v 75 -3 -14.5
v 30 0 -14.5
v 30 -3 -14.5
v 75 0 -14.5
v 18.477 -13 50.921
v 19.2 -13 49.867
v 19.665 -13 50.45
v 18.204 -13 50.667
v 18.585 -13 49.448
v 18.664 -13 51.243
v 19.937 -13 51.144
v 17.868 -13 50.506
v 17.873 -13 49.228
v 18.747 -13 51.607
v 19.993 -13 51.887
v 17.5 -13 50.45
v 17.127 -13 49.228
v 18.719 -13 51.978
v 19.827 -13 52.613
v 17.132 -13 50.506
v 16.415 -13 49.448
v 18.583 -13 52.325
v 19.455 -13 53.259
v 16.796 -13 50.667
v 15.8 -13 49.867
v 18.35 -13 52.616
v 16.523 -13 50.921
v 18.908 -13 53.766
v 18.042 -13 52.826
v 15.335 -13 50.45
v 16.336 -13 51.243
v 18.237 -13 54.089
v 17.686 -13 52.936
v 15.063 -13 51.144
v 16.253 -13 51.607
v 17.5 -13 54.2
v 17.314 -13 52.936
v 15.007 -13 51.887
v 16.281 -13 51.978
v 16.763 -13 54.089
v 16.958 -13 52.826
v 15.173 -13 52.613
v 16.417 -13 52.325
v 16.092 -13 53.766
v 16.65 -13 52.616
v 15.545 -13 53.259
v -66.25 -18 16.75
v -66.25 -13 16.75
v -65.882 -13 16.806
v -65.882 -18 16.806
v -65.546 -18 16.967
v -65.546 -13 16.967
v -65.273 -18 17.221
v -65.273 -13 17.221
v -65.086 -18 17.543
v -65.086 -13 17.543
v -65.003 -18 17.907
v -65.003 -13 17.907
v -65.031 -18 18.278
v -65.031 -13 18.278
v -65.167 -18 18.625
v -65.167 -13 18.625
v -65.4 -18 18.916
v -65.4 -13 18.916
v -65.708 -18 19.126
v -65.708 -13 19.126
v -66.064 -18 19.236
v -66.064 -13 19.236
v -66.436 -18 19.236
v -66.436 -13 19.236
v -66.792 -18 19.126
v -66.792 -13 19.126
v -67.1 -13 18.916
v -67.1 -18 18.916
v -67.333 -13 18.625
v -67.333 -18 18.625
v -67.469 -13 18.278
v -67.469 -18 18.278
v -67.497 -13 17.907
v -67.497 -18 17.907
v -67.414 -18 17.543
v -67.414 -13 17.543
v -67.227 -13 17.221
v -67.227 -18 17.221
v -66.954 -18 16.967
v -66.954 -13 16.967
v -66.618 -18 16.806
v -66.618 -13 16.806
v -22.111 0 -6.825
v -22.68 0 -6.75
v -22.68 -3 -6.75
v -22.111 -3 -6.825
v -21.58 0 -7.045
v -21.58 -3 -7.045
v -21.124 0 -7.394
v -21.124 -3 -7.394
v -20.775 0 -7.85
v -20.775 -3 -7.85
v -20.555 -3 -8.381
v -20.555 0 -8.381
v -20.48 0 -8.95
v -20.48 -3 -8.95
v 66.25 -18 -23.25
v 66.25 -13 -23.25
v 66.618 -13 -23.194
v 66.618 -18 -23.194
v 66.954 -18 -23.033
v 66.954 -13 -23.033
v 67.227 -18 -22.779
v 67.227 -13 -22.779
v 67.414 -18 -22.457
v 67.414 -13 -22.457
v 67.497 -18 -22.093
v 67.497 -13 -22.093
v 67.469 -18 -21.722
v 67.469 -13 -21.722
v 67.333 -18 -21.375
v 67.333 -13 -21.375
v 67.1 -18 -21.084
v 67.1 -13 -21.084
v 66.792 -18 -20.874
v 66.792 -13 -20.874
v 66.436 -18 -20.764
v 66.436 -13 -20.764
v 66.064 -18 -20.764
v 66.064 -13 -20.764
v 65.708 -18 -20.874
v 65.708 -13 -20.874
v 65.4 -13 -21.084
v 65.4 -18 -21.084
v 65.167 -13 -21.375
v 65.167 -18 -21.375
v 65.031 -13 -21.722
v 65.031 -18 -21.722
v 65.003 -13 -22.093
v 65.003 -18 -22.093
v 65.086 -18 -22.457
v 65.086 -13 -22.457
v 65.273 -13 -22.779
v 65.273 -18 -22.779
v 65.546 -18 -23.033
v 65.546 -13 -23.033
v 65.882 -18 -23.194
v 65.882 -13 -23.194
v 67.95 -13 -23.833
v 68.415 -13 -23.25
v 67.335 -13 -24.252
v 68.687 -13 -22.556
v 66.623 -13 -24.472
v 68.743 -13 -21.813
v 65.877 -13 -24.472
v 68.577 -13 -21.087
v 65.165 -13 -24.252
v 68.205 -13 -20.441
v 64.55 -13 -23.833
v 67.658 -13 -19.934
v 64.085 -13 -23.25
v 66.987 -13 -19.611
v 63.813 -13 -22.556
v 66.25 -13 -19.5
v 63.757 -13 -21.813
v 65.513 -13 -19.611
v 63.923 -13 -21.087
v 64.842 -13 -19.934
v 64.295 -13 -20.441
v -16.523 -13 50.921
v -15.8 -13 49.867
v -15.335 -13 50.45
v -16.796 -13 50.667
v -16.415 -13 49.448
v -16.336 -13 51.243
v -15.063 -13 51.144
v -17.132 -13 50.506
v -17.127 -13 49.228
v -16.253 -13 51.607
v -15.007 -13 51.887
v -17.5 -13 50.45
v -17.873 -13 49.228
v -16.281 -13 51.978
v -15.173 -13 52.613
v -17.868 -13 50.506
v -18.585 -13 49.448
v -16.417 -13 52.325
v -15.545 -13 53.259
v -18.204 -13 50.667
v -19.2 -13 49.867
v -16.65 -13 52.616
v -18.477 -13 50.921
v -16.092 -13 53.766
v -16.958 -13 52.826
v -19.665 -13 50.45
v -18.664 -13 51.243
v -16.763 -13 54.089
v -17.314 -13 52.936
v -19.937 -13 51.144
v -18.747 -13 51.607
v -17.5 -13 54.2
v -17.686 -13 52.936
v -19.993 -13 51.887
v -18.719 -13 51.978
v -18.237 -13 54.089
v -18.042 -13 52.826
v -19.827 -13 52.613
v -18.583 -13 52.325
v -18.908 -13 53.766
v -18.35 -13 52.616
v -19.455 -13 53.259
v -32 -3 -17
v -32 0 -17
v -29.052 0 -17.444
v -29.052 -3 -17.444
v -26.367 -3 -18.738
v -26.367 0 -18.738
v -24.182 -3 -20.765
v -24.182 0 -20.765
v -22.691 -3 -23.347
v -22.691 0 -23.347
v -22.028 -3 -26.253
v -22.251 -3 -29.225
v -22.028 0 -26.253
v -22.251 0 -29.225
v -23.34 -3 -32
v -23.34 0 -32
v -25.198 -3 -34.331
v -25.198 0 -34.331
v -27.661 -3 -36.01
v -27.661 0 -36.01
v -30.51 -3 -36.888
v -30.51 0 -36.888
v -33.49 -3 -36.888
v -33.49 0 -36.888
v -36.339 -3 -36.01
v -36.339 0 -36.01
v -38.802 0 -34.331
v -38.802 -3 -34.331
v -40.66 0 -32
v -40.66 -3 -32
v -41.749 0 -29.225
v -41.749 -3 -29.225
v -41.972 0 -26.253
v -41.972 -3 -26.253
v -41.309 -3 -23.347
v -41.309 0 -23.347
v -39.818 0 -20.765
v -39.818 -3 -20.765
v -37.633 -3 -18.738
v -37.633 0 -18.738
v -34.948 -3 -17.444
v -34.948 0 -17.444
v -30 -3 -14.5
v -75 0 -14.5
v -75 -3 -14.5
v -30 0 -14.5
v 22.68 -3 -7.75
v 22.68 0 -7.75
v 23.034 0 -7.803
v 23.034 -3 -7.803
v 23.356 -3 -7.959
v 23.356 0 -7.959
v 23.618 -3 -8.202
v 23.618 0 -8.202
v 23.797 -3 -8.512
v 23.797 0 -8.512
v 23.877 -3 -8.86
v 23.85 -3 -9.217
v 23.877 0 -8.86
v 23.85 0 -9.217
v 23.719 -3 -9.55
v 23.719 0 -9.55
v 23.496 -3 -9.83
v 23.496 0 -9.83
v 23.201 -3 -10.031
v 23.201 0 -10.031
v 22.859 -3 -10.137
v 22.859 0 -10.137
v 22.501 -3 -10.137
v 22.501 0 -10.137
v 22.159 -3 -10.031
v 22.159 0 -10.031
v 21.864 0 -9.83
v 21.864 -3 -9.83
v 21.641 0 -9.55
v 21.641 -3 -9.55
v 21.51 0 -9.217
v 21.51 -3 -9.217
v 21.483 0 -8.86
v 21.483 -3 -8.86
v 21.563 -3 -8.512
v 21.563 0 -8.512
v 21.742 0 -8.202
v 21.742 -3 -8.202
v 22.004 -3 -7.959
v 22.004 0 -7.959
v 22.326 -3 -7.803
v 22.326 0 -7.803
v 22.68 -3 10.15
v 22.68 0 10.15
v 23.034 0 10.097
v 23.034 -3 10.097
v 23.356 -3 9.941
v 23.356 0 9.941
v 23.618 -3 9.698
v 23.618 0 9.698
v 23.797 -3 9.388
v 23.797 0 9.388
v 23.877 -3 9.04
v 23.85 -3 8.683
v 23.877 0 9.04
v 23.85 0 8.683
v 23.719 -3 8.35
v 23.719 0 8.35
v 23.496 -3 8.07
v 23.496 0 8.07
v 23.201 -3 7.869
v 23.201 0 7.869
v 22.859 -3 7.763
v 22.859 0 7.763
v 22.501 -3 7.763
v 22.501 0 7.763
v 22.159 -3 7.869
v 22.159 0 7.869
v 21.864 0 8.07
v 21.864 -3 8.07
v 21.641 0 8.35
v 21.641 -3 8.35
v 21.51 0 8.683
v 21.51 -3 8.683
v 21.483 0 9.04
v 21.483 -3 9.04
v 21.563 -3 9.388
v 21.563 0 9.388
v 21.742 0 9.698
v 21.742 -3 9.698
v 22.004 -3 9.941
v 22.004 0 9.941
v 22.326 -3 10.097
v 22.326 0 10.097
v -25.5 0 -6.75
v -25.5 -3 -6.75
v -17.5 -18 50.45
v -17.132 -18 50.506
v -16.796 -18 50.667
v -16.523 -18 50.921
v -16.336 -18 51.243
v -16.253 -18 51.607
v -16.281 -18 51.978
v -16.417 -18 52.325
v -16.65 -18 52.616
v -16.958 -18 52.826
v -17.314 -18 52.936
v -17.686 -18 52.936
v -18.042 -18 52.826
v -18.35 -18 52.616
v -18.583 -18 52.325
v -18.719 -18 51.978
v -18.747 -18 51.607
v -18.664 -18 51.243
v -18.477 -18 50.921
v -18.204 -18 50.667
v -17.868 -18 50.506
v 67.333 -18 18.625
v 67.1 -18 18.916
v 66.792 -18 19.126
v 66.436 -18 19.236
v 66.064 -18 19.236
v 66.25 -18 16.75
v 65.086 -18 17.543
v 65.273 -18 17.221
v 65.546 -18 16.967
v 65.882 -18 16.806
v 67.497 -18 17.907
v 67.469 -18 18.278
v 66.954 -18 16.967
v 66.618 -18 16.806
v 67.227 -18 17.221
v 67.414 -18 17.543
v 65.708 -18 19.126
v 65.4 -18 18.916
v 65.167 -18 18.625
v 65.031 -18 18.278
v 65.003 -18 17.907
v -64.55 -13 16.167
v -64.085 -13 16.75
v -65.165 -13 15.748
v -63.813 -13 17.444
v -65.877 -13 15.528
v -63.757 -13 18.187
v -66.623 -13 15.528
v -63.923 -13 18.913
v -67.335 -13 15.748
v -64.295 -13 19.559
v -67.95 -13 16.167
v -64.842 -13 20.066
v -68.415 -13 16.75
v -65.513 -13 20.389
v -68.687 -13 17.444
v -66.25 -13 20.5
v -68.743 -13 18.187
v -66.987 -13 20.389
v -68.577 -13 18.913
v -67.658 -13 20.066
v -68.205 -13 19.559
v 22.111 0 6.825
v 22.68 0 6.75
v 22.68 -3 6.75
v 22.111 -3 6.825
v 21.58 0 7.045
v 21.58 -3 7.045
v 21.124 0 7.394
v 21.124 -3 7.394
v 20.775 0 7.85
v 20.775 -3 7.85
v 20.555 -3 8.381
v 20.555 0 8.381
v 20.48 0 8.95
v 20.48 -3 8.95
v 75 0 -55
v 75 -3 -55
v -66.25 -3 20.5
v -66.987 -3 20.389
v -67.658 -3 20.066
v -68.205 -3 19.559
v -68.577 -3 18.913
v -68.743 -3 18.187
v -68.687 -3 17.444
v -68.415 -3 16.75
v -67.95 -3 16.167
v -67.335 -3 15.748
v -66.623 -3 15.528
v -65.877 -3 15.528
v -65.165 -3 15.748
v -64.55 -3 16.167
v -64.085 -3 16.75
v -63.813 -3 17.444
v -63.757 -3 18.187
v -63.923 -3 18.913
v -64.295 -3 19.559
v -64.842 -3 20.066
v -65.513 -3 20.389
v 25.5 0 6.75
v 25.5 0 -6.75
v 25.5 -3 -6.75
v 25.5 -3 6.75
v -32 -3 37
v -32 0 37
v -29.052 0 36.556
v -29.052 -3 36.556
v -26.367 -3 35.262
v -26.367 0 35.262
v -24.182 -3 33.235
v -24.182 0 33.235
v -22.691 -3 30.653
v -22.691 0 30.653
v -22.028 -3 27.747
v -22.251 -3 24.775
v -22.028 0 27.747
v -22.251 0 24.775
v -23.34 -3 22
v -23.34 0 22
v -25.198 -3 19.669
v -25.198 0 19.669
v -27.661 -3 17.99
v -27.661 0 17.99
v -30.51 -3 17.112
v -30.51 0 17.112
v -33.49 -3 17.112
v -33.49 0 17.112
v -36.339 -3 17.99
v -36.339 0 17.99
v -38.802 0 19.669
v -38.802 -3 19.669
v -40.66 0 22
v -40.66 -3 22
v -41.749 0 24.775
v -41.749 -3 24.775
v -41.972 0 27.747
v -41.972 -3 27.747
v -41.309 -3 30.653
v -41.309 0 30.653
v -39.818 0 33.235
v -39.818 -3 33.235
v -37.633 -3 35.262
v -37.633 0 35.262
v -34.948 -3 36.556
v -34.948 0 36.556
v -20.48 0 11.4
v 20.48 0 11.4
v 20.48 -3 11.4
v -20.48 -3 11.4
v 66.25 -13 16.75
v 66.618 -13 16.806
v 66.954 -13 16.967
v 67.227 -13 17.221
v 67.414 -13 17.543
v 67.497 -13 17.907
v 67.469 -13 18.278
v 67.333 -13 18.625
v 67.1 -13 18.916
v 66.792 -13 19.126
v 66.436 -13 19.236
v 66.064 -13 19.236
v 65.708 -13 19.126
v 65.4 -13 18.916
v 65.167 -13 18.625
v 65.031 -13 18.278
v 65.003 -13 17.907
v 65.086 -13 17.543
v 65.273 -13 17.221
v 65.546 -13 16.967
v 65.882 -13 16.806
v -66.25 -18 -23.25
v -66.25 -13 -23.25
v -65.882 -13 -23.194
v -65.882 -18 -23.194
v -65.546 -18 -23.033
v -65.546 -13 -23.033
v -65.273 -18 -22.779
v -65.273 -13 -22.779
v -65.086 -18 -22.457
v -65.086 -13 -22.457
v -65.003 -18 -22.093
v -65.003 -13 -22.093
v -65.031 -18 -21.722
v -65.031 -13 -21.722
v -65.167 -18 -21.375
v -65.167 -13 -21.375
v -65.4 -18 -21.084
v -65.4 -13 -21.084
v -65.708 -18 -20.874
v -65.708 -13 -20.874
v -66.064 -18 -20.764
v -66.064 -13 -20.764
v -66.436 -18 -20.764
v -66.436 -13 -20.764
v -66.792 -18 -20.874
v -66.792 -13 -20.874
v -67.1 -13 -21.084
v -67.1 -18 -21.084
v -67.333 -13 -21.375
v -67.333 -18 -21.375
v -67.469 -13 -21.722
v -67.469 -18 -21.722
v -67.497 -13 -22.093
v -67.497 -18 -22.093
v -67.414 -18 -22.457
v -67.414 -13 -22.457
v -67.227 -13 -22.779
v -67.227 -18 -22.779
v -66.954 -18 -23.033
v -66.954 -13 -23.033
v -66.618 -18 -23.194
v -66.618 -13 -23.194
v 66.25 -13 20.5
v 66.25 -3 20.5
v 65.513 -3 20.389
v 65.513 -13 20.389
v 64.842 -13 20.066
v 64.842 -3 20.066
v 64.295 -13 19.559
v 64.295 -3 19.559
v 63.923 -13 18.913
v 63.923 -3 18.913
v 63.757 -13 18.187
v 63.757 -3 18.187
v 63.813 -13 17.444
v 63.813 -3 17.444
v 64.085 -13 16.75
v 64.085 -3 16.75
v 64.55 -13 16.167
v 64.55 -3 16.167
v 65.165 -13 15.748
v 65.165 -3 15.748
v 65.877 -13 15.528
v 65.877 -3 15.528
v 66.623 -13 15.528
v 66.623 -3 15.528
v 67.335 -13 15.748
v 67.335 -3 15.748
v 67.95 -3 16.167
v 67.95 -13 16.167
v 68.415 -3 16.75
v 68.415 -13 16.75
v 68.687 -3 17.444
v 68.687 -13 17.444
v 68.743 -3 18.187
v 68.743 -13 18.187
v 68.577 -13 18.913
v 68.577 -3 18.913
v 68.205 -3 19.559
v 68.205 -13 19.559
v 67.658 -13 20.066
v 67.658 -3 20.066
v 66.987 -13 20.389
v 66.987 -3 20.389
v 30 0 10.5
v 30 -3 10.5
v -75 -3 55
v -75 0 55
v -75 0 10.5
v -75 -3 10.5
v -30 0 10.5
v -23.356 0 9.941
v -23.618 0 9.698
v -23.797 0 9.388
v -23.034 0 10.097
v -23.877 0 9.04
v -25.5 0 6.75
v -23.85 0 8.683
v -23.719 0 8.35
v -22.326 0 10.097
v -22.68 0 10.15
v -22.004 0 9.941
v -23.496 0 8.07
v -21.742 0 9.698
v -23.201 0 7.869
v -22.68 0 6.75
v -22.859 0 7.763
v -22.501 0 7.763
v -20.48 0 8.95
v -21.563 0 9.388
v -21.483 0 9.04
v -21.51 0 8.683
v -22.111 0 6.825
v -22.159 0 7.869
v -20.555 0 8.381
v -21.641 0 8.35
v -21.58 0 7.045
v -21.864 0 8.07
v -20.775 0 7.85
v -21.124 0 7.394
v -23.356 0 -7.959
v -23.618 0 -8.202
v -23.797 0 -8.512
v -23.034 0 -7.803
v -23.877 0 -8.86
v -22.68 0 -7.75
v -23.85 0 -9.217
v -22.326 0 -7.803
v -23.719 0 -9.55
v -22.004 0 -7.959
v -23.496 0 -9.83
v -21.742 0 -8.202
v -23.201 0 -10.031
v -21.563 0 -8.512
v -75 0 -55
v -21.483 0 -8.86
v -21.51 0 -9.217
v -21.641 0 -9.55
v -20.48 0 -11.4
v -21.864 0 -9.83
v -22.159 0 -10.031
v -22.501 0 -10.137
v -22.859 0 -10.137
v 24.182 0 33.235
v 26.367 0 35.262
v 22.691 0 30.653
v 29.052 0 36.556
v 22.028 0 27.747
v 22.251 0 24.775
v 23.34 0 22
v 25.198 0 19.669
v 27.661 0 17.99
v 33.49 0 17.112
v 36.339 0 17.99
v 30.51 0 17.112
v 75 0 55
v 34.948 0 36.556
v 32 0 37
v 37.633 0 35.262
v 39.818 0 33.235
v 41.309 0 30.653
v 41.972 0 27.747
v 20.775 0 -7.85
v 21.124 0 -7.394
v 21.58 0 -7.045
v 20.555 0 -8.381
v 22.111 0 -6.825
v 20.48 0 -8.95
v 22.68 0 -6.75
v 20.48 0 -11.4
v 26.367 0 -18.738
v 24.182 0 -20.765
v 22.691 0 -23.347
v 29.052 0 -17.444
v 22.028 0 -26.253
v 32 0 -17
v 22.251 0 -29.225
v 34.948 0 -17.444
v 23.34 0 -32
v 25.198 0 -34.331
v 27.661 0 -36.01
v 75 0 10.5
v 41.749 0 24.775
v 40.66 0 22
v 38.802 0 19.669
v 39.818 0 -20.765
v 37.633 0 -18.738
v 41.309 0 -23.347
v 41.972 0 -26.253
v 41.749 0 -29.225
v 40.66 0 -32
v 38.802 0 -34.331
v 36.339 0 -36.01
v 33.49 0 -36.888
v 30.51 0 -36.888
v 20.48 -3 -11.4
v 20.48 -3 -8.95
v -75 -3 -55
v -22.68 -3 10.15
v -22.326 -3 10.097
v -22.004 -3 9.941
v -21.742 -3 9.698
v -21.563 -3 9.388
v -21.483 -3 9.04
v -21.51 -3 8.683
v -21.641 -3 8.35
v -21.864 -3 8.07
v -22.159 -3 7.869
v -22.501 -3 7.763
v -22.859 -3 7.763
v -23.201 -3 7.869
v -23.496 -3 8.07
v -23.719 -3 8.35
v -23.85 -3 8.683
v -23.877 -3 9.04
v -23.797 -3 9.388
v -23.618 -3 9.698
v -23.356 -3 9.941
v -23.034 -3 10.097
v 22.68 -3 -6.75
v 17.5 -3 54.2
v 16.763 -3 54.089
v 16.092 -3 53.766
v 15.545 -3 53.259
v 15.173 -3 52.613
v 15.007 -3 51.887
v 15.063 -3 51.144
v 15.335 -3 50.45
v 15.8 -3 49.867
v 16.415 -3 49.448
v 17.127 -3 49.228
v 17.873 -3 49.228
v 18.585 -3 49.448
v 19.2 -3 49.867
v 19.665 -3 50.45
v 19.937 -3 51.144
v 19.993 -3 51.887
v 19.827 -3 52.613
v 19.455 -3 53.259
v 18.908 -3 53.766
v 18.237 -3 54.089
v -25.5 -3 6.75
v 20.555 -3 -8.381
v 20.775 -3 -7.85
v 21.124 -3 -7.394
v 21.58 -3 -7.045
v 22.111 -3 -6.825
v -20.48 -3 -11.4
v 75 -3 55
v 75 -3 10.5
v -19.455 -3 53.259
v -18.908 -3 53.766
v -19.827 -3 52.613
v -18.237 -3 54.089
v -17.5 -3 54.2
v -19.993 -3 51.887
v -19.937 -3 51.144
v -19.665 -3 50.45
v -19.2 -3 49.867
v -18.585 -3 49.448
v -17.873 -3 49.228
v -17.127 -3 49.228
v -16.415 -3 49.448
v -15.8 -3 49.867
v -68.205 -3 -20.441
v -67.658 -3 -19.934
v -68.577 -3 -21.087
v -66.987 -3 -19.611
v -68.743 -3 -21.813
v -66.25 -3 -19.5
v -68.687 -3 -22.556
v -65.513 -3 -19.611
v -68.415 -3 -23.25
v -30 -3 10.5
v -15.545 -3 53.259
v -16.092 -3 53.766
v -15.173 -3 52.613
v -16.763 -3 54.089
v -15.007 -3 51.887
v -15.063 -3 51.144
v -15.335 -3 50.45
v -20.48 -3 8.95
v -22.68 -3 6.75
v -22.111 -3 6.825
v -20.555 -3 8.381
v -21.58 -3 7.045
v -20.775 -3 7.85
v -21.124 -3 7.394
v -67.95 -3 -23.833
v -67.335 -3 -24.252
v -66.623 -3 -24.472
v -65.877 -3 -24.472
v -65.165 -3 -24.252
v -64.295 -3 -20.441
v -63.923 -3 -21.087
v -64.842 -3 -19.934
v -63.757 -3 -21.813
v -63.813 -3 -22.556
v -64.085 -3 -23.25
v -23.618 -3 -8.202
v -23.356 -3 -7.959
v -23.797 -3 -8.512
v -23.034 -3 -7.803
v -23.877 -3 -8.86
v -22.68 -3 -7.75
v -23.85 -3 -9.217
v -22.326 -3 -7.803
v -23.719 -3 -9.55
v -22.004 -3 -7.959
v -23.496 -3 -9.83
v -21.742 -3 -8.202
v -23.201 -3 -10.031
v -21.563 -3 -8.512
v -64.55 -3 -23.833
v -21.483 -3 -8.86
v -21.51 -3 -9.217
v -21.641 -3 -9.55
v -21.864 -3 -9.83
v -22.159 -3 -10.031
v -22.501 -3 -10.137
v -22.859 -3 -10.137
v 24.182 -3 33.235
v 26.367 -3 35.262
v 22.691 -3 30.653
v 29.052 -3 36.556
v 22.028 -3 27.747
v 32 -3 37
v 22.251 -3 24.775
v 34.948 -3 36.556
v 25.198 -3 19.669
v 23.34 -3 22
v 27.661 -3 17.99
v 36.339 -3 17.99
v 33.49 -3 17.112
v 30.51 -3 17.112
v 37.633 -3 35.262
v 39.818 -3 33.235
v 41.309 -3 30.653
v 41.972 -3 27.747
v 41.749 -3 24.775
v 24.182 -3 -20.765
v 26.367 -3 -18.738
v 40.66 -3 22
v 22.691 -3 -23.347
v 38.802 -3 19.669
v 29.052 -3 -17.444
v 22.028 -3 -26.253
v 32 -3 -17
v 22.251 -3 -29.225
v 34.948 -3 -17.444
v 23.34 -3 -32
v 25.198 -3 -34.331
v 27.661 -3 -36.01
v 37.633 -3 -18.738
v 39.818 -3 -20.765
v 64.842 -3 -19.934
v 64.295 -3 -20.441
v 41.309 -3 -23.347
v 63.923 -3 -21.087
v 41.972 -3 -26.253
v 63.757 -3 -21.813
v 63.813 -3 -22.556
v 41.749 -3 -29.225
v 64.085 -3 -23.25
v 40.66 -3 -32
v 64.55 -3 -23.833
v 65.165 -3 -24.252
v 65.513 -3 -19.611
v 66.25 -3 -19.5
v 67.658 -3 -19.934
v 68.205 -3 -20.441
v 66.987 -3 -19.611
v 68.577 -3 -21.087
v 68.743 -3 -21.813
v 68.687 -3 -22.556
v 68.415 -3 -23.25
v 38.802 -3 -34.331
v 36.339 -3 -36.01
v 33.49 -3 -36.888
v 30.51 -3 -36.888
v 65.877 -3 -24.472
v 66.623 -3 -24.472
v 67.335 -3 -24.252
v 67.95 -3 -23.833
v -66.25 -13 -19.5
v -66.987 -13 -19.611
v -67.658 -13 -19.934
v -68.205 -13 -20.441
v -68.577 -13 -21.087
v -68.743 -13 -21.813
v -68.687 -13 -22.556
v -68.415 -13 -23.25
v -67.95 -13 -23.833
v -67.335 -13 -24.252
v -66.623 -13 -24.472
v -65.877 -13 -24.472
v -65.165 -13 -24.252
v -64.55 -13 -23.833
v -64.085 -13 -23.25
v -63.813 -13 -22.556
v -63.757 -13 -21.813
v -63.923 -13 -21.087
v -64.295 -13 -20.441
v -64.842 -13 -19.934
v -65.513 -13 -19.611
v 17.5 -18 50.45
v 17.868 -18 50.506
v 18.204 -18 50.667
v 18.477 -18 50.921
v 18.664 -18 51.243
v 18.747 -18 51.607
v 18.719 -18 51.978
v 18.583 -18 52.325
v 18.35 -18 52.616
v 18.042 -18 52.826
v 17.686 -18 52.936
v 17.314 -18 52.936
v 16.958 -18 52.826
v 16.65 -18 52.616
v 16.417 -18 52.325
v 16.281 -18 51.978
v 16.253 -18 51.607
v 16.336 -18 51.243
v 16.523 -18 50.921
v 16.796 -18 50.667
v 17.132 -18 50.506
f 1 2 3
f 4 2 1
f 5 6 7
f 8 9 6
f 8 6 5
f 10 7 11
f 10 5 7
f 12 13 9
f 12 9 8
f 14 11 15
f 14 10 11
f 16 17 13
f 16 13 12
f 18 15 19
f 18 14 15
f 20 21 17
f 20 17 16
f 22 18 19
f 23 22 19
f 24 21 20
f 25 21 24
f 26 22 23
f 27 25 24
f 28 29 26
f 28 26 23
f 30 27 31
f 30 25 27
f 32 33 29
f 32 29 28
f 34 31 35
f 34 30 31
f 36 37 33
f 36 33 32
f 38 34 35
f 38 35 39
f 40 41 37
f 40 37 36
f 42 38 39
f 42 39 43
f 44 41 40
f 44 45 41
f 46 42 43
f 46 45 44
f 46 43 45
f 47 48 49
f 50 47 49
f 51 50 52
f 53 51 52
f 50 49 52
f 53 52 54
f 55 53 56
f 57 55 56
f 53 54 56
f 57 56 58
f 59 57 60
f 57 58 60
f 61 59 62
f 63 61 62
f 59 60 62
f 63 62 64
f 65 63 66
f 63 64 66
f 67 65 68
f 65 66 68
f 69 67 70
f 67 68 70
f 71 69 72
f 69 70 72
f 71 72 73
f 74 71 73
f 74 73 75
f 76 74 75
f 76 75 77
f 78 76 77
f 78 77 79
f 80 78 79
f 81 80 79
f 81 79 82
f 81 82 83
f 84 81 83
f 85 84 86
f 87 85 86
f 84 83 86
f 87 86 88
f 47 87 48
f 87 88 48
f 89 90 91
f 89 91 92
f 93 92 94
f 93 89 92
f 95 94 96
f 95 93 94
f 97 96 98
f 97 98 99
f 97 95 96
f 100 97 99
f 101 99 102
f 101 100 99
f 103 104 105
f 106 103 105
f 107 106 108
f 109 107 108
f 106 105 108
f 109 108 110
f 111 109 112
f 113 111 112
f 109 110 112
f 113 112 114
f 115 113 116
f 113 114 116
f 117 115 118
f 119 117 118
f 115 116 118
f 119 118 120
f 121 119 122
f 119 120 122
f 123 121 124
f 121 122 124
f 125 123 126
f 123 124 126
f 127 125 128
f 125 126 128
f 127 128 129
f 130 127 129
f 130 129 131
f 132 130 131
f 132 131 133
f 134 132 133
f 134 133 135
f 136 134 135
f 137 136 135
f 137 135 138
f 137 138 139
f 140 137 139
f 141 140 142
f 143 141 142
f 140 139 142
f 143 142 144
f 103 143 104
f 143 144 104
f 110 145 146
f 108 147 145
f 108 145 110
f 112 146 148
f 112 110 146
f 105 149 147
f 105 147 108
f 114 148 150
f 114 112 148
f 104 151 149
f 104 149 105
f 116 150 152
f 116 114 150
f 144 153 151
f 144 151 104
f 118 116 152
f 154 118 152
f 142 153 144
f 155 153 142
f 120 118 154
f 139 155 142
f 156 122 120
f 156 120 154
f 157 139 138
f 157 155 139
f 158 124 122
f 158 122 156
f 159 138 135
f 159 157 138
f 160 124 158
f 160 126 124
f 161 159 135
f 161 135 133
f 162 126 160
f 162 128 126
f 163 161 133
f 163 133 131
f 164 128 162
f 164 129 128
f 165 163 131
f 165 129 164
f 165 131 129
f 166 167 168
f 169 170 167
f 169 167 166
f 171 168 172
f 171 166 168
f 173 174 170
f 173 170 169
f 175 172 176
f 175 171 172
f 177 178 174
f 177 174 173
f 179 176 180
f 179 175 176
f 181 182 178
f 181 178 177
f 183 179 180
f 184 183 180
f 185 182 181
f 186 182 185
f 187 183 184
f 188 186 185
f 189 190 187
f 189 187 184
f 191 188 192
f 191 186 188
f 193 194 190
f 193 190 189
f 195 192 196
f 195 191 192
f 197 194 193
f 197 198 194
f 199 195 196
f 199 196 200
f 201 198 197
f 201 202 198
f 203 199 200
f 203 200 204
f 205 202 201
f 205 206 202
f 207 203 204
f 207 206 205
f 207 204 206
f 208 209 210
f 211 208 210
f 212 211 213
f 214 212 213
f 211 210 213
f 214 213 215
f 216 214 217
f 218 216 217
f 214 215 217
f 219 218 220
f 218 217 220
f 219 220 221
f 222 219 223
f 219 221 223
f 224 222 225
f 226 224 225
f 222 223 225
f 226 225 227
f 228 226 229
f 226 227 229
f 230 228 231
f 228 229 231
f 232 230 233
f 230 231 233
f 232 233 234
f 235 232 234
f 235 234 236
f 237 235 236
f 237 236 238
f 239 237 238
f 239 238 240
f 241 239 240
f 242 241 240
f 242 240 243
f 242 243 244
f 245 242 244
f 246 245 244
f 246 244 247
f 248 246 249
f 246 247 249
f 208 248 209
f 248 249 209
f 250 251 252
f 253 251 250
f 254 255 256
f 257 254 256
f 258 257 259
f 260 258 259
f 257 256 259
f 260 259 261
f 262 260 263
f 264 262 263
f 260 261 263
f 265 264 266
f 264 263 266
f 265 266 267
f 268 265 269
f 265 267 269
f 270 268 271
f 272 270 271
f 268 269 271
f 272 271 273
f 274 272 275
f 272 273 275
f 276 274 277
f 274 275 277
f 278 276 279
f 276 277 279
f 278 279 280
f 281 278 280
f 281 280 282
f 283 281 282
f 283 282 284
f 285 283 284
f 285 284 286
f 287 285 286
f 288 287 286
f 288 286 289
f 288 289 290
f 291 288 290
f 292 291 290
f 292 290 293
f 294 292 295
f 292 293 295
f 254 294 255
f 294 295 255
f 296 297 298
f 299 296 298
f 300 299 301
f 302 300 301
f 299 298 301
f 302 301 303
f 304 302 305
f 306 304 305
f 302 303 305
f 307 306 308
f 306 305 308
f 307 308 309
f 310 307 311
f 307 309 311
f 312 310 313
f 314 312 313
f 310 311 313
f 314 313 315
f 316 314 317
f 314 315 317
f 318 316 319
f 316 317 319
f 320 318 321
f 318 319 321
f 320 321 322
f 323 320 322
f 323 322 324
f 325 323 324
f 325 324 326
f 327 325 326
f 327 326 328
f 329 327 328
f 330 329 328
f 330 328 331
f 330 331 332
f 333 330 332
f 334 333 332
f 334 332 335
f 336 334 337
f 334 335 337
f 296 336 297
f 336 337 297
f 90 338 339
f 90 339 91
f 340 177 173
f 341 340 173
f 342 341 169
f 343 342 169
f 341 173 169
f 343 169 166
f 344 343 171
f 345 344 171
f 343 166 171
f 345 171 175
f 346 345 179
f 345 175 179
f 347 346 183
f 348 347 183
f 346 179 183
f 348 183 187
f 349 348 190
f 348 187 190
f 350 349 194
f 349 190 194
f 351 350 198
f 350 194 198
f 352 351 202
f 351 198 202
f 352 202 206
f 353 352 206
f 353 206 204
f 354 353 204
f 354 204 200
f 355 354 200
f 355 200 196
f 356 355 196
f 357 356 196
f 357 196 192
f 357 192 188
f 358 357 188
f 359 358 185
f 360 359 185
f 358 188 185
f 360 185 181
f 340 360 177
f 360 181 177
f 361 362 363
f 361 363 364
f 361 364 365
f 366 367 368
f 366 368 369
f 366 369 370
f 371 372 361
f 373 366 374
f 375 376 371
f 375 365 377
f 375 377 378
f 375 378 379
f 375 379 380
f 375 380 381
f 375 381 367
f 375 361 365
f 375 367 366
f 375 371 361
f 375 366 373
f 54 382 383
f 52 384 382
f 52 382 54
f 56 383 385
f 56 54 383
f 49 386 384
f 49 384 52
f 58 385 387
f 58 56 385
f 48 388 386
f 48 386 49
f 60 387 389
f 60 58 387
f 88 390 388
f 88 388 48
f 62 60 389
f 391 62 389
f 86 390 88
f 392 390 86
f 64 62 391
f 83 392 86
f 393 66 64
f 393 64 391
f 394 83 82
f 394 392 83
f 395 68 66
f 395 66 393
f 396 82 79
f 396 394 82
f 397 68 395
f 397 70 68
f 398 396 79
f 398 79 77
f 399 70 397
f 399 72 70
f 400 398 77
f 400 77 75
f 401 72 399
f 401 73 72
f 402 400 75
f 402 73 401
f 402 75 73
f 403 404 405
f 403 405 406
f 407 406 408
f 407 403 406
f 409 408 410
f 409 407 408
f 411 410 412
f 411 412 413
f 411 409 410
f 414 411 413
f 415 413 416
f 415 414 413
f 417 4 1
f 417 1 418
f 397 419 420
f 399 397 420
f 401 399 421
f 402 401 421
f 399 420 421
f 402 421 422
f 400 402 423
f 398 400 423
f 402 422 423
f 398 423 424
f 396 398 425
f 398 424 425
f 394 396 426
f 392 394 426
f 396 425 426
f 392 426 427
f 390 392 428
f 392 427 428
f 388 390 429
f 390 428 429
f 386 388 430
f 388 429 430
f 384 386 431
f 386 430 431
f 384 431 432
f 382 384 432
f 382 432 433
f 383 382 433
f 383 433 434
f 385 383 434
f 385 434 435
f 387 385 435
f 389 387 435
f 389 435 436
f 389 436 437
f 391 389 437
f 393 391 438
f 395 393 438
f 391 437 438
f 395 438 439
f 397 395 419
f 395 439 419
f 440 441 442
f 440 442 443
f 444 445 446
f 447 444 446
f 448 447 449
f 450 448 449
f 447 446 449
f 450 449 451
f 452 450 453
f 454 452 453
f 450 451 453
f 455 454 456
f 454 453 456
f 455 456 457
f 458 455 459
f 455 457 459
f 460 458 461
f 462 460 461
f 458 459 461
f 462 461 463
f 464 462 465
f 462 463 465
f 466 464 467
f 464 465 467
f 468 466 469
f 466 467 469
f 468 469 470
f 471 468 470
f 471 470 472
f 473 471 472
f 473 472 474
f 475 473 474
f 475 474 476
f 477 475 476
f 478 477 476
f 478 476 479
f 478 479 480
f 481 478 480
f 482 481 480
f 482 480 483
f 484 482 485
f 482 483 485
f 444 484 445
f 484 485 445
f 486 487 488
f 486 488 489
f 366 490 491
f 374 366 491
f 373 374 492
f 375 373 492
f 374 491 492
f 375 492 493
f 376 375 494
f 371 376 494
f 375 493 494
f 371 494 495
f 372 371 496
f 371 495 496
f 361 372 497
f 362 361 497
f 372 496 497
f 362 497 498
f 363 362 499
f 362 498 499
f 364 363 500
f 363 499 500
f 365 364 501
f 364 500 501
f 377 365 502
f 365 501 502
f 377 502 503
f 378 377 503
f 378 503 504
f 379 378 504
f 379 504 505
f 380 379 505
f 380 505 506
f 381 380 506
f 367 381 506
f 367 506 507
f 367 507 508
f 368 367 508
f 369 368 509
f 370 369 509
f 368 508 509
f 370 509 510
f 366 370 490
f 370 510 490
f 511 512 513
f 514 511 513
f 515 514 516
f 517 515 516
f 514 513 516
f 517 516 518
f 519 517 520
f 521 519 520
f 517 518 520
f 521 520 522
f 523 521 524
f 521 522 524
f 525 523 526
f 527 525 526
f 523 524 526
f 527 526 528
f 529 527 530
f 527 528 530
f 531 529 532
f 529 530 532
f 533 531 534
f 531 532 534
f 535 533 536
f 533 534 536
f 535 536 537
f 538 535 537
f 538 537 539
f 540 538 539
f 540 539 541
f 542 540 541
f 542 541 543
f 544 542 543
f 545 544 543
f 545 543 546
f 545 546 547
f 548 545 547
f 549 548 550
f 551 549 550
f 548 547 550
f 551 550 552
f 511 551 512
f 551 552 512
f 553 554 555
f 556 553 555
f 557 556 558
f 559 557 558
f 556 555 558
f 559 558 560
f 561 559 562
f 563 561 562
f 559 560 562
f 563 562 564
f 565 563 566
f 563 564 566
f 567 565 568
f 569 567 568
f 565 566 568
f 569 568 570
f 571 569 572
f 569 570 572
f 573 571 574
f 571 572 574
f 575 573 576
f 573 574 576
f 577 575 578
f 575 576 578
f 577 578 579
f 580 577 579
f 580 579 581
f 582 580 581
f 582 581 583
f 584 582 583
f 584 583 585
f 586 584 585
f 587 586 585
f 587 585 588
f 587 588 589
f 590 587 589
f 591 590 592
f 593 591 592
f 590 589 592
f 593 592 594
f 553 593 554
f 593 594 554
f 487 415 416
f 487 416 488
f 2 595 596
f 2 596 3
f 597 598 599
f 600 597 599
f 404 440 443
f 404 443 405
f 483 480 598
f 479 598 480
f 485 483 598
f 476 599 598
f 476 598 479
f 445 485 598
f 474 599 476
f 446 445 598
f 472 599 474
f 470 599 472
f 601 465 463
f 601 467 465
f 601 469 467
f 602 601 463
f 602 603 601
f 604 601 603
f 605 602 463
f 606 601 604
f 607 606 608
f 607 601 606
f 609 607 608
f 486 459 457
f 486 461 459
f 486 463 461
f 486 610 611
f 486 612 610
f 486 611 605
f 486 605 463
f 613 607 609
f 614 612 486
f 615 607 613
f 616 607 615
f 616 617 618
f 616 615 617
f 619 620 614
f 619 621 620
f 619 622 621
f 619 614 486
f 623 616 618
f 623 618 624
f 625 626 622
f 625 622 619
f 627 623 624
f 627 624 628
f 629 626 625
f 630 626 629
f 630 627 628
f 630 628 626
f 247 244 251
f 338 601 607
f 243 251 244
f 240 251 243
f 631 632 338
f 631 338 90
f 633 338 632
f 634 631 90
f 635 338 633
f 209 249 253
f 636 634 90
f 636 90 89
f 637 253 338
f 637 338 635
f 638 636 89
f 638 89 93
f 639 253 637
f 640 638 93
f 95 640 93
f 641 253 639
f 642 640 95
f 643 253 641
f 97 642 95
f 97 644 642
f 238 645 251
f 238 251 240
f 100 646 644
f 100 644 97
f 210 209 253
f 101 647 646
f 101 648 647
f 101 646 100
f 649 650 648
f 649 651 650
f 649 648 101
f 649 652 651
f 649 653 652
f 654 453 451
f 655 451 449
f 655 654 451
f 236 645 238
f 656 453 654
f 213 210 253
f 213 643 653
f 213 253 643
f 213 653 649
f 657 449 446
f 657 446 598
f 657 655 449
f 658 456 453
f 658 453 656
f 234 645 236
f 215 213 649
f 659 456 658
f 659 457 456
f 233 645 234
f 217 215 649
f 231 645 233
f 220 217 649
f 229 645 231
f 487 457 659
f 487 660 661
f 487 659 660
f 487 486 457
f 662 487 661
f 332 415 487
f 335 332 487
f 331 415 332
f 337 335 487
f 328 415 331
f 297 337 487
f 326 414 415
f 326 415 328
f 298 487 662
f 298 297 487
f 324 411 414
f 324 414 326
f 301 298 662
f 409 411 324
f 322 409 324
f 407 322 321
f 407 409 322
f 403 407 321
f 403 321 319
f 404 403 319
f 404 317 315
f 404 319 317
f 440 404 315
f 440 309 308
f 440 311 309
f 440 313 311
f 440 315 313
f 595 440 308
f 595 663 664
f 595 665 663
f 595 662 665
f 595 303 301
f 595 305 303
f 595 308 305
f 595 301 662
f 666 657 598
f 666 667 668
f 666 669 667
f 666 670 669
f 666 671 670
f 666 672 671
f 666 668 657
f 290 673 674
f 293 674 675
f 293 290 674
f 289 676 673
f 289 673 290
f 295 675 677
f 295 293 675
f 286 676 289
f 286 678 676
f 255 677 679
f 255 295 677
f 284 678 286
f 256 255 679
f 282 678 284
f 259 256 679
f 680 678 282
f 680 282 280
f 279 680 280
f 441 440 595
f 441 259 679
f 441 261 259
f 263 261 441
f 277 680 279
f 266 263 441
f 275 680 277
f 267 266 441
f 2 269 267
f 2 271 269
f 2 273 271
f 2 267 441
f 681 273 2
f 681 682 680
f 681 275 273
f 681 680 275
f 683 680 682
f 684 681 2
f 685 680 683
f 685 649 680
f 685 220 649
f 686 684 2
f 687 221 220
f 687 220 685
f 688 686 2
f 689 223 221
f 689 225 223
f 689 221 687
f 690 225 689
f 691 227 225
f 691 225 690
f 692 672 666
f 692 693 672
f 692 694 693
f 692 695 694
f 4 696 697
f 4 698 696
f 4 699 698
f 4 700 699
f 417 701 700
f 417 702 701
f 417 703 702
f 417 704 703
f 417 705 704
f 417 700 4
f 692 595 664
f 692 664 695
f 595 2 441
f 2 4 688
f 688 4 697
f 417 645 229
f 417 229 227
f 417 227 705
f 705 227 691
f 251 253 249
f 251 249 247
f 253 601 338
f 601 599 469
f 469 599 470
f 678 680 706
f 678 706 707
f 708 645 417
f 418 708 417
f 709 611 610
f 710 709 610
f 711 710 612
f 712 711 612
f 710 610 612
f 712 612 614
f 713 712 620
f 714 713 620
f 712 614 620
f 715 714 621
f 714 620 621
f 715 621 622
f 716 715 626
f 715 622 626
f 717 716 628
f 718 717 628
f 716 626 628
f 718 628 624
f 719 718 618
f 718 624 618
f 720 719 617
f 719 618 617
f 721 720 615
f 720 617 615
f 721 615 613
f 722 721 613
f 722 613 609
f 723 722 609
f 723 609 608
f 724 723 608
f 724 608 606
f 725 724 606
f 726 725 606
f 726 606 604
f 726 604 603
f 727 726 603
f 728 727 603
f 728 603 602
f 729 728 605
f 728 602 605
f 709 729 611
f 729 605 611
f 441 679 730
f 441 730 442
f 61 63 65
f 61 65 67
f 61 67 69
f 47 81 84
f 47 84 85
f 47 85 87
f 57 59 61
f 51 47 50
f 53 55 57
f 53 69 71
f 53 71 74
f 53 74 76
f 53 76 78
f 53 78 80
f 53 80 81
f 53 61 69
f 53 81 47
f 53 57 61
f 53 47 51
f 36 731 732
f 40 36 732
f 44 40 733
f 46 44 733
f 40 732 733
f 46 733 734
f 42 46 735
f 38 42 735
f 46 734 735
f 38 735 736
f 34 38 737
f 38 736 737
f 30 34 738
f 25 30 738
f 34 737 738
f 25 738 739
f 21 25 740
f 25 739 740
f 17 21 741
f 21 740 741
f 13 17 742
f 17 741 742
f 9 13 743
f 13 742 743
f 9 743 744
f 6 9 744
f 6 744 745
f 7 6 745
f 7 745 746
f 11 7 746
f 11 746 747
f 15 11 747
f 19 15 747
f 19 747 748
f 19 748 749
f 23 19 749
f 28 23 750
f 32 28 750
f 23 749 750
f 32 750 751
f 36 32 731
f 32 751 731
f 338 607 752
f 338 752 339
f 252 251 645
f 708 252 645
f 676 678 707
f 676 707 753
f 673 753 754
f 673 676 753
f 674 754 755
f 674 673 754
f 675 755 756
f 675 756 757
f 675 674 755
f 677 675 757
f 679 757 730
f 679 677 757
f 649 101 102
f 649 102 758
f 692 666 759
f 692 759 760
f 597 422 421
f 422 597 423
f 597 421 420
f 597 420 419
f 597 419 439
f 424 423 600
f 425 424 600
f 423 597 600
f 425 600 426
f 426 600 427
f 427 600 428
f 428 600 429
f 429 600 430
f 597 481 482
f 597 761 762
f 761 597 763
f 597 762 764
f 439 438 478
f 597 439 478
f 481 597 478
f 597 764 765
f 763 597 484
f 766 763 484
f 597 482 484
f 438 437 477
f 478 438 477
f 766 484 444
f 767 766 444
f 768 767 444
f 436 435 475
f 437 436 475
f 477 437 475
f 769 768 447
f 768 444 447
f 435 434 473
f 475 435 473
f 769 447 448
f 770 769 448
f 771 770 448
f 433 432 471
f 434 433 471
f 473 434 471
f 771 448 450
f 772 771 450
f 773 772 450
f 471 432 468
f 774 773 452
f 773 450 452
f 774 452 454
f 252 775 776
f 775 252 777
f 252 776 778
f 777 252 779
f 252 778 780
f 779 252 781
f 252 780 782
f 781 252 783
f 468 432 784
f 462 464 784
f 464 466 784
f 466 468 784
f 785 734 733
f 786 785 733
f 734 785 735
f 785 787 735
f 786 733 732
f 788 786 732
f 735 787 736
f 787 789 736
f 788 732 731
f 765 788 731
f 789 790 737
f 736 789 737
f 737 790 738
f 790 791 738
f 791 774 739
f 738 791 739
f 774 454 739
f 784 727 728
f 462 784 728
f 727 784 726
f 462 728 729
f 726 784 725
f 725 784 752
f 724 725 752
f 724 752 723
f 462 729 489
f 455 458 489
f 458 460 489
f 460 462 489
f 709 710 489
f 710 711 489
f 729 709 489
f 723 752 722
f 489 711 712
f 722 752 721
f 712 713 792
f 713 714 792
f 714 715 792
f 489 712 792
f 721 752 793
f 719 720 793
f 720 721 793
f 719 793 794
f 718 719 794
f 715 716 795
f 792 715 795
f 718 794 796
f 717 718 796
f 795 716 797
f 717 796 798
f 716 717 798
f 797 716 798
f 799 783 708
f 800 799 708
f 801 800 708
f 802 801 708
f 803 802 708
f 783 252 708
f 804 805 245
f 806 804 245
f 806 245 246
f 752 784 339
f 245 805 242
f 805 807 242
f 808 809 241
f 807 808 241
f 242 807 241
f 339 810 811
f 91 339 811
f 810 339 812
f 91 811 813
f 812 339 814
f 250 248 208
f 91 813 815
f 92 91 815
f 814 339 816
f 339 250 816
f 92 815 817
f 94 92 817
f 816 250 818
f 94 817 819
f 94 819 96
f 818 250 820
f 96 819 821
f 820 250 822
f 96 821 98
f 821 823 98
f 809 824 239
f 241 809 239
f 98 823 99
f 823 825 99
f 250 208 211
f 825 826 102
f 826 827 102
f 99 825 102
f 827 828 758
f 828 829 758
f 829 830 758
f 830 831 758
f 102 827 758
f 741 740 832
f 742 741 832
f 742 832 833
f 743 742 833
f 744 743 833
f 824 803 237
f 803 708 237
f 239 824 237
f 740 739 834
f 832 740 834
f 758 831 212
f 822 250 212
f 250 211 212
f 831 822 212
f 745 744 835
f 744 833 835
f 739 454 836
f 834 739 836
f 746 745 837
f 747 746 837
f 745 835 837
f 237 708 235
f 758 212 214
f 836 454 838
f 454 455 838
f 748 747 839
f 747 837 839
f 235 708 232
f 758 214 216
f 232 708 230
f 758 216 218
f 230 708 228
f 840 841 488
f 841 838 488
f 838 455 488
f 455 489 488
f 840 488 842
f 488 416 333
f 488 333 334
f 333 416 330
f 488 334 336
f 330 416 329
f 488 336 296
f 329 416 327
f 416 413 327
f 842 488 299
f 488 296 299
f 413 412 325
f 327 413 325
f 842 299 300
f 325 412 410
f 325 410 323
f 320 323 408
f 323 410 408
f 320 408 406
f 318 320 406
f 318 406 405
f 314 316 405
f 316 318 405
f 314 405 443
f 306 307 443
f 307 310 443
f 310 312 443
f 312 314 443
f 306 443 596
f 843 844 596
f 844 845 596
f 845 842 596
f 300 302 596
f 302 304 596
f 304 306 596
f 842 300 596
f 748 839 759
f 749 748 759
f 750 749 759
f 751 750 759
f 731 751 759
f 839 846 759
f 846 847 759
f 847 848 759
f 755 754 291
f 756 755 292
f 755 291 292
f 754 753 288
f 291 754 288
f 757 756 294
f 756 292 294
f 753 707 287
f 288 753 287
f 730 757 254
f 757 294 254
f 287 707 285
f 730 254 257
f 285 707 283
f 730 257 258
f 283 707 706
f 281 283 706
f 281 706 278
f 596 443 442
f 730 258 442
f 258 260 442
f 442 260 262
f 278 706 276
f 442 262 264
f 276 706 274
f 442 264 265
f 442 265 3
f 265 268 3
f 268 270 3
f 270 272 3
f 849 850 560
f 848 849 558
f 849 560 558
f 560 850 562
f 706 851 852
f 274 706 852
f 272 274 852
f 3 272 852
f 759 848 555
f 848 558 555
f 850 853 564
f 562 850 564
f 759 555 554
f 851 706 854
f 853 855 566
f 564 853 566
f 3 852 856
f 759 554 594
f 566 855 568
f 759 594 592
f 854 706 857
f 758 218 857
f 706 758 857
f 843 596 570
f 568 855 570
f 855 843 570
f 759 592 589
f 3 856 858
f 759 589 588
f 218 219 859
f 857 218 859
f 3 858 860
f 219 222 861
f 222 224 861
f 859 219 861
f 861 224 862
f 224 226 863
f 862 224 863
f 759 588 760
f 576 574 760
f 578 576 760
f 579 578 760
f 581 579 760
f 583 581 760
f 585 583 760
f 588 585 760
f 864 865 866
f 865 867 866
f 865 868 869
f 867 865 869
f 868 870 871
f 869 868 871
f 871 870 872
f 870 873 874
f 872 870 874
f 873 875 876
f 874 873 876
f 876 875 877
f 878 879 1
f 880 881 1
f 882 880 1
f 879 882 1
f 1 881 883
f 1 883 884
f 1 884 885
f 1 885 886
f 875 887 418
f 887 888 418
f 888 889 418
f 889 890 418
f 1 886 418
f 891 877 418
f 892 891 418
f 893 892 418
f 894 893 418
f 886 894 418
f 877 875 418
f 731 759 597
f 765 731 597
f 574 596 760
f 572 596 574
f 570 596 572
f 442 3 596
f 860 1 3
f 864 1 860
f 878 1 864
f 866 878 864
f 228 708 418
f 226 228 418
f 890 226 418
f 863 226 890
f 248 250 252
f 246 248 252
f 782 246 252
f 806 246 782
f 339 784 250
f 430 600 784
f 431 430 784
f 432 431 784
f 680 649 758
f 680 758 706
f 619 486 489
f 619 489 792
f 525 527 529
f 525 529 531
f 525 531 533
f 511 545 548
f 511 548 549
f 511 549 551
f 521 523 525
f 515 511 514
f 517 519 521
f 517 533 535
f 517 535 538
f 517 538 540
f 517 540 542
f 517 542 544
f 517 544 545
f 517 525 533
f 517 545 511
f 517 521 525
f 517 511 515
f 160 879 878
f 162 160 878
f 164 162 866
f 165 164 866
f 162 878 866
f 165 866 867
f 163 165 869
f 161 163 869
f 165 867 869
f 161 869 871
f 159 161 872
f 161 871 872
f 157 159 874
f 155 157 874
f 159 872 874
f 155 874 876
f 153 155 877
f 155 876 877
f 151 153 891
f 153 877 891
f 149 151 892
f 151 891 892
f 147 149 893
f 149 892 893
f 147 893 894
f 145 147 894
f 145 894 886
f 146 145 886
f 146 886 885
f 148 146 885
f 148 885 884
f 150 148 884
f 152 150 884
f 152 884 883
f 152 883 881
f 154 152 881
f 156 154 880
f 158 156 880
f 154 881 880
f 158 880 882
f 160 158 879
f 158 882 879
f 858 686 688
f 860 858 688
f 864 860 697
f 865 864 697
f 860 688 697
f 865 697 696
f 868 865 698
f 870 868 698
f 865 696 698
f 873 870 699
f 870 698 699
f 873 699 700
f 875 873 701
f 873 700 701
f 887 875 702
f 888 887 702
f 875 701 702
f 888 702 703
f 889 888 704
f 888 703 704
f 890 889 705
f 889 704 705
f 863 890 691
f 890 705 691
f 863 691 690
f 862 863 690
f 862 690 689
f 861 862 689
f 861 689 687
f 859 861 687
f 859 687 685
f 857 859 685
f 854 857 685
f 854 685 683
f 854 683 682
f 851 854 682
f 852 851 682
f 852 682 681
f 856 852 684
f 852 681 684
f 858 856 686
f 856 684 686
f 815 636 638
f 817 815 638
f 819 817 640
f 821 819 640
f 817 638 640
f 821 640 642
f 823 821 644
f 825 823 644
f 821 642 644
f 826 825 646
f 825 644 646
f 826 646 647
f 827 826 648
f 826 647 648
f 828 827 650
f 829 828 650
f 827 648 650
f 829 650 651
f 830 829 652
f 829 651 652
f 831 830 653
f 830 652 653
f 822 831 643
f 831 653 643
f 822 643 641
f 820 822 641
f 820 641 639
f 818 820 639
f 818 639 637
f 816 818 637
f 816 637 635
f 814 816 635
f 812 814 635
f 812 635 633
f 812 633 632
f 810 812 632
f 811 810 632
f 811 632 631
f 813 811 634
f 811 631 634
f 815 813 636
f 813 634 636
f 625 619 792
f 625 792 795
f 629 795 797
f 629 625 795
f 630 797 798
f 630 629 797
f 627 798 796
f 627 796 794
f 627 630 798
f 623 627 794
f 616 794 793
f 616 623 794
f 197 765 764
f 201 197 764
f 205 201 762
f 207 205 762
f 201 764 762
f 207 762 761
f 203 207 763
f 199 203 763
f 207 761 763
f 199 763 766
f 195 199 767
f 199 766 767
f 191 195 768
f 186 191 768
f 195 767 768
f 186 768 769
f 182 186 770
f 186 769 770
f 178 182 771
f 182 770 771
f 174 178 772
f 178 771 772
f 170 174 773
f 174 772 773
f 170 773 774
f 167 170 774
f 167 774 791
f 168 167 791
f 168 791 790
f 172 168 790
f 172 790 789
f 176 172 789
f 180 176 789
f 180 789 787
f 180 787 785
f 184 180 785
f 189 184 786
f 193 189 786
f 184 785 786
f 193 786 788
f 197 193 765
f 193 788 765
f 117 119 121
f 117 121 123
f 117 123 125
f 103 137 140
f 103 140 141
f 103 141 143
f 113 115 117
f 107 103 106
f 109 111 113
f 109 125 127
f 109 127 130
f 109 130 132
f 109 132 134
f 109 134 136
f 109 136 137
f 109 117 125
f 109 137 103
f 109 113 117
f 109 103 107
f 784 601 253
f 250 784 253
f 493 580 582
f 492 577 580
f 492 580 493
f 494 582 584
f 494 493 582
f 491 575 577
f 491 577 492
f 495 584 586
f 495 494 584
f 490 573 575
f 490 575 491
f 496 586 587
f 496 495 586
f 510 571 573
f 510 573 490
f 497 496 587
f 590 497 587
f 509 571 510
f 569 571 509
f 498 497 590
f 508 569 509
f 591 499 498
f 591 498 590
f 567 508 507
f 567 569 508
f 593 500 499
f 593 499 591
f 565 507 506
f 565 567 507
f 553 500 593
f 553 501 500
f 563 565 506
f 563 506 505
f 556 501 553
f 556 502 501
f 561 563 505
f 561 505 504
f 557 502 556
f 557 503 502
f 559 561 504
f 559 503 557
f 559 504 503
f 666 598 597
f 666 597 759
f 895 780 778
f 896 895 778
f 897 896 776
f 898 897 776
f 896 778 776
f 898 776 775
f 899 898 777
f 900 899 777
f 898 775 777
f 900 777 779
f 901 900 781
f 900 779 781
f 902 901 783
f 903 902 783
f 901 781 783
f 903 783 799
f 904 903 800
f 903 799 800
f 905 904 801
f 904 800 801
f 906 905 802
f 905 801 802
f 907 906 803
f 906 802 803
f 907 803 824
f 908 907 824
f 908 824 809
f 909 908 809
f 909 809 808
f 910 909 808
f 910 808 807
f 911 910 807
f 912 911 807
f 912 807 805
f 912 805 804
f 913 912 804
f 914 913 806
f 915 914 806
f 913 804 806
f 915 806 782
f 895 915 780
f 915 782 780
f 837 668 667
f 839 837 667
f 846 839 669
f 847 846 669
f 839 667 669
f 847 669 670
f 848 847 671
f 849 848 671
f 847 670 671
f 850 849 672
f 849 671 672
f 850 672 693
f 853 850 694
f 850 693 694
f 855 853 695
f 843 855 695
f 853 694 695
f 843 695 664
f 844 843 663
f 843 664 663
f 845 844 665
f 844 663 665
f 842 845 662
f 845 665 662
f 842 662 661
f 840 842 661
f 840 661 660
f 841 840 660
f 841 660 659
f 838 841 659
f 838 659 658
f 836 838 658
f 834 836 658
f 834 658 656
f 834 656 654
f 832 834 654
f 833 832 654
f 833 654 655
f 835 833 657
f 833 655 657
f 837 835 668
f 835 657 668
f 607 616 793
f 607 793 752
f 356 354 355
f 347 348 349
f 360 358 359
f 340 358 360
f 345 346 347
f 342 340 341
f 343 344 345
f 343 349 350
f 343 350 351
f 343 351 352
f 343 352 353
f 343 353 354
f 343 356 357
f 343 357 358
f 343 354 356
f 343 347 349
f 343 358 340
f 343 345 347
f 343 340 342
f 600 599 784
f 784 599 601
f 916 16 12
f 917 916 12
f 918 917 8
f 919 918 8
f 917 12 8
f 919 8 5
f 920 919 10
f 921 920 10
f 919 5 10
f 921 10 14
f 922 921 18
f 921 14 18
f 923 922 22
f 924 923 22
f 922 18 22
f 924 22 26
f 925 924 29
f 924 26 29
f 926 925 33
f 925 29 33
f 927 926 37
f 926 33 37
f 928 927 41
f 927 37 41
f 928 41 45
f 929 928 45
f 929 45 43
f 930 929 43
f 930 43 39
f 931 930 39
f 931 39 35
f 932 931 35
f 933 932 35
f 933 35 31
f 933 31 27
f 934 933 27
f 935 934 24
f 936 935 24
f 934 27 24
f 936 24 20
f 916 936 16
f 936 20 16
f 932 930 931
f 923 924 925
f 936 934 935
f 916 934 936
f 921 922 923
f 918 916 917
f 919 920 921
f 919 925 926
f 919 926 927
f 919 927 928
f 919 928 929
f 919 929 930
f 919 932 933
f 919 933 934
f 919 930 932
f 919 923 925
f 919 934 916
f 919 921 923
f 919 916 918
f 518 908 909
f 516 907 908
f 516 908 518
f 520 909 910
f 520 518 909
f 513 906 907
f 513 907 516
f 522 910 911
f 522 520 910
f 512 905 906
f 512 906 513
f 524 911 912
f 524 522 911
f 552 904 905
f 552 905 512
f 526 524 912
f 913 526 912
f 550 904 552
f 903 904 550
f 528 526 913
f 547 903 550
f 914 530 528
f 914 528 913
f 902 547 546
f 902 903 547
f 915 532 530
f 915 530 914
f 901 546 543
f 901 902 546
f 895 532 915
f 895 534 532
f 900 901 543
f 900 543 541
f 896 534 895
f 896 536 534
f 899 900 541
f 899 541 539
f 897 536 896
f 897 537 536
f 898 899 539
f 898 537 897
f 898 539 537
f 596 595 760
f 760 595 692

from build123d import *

# Parameters (mm, degrees)
SKETCH2_W           = 150
SKETCH2_H           = 110
BOSS_EXTRUDE1_DEPTH = 3
SKETCH3_R           = 2.5
BOSS_EXTRUDE2_DEPTH = 10
SKETCH4_R           = 1.25
BOSS_EXTRUDE3_DEPTH = 5
SKETCH5_W           = 45
SKETCH5_H           = 25
CUT_EXTRUDE1_DEPTH  = 3
SKETCH6_R           = 10
CUT_EXTRUDE2_DEPTH  = 3
SKETCH7_R           = 1.2
CUT_EXTRUDE3_DEPTH  = 3


with BuildPart() as part:
    # Sketch2 → Boss-Extrude1 (new body)
    with BuildSketch(Plane(origin=(0, 0, 0), x_dir=(1, 0, 0), z_dir=(0, 1, 0))):
        Rectangle(SKETCH2_W, SKETCH2_H)
    extrude(amount=-BOSS_EXTRUDE1_DEPTH)

    # Sketch3 → Boss-Extrude2 (add)
    with BuildSketch(Plane.XZ.offset(3)):
        with Locations(Location((-17.5, 51.7, 0), (0, 0, 90))):
            Circle(SKETCH3_R)
        with Locations(Location((17.5, 51.7, 0), (0, 0, 90))):
            Circle(SKETCH3_R)
        with Locations(Location((66.25, 18, 0), (0, 0, 90))):
            Circle(SKETCH3_R)
        with Locations(Location((66.25, -22, 0), (0, 0, 90))):
            Circle(SKETCH3_R)
        with Locations(Location((-66.25, 18, 0), (0, 0, 90))):
            Circle(SKETCH3_R)
        with Locations(Location((-66.25, -22, 0), (0, 0, 90))):
            Circle(SKETCH3_R)
    extrude(amount=BOSS_EXTRUDE2_DEPTH)

    # Sketch4 → Boss-Extrude3 (add)
    with BuildSketch(Plane.XZ.offset(13)):
        with Locations(Location((17.5, 51.7, 0), (0, 0, 270))):
            Circle(SKETCH4_R)
        with Locations(Location((-17.5, 51.7, 0), (0, 0, 270))):
            Circle(SKETCH4_R)
        with Locations(Location((-66.25, 18, 0), (0, 0, 270))):
            Circle(SKETCH4_R)
        with Locations(Location((-66.25, -22, 0), (0, 0, 270))):
            Circle(SKETCH4_R)
        with Locations(Location((66.25, -22, 0), (0, 0, 270))):
            Circle(SKETCH4_R)
        with Locations(Location((66.25, 18, 0), (0, 0, 270))):
            Circle(SKETCH4_R)
    extrude(amount=BOSS_EXTRUDE3_DEPTH)

    # Sketch5 → Cut-Extrude1 (cut)
    with BuildSketch(Plane(origin=(0, 0, 0), x_dir=(1, 0, 0), z_dir=(0, 1, 0))):
        with Locations((-52.5, 2)):
            Rectangle(SKETCH5_W, SKETCH5_H)
        with Locations((52.5, 2)):
            Rectangle(SKETCH5_W, SKETCH5_H)
    extrude(amount=-CUT_EXTRUDE1_DEPTH, mode=Mode.SUBTRACT)

    # Sketch6 → Cut-Extrude2 (cut)
    with BuildSketch(Plane(origin=(0, 0, 0), x_dir=(1, 0, 0), z_dir=(0, 1, 0))):
        with Locations(Location((-32, 27, 0), (0, 0, 270))):
            Circle(SKETCH6_R)
        with Locations(Location((-32, -27, 0), (0, 0, 270))):
            Circle(SKETCH6_R)
        with Locations(Location((32, -27, 0), (0, 0, 270))):
            Circle(SKETCH6_R)
        with Locations(Location((32, 27, 0), (0, 0, 270))):
            Circle(SKETCH6_R)
    extrude(amount=-CUT_EXTRUDE2_DEPTH, mode=Mode.SUBTRACT)

    # Sketch7 → Cut-Extrude3 (cut)
    with BuildSketch(Plane(origin=(0, 0, 0), x_dir=(1, 0, 0), z_dir=(0, 1, 0))):
        with Locations(Location((-22.68, 8.95, 0), (0, 0, 270))):
            Circle(SKETCH7_R)
        with Locations(Location((22.68, 8.95, 0), (0, 0, 270))):
            Circle(SKETCH7_R)
        with Locations(Location((22.68, -8.95, 0), (0, 0, 270))):
            Circle(SKETCH7_R)
        with Locations(Location((-22.68, -8.95, 0), (0, 0, 270))):
            Circle(SKETCH7_R)
        with BuildLine():
            Line((-20.48, 11.4), (20.48, 11.4))
            Line((20.48, 11.4), (20.48, 8.95))
            ThreePointArc((20.48, 8.95), (21.124365081, 7.394365081), (22.68, 6.75))
            Line((22.68, 6.75), (25.5, 6.75))
            Line((25.5, 6.75), (25.5, -6.75))
            Line((25.5, -6.75), (22.68, -6.75))
            ThreePointArc((22.68, -6.75), (21.124365081, -7.394365081), (20.48, -8.95))
            Line((20.48, -8.95), (20.48, -11.4))
            Line((20.48, -11.4), (-20.48, -11.4))
            Line((-20.48, -11.4), (-20.48, -8.95))
            ThreePointArc((-20.48, -8.95), (-21.124365081, -7.394365081), (-22.68, -6.75))
            Line((-22.68, -6.75), (-25.5, -6.75))
            Line((-25.5, -6.75), (-25.5, 6.75))
            Line((-25.5, 6.75), (-22.68, 6.75))
            ThreePointArc((-22.68, 6.75), (-21.124365081, 7.394365081), (-20.48, 8.95))
            Line((-20.48, 8.95), (-20.48, 11.4))
        make_face()
    extrude(amount=-CUT_EXTRUDE3_DEPTH, mode=Mode.SUBTRACT)


solid = part.part
